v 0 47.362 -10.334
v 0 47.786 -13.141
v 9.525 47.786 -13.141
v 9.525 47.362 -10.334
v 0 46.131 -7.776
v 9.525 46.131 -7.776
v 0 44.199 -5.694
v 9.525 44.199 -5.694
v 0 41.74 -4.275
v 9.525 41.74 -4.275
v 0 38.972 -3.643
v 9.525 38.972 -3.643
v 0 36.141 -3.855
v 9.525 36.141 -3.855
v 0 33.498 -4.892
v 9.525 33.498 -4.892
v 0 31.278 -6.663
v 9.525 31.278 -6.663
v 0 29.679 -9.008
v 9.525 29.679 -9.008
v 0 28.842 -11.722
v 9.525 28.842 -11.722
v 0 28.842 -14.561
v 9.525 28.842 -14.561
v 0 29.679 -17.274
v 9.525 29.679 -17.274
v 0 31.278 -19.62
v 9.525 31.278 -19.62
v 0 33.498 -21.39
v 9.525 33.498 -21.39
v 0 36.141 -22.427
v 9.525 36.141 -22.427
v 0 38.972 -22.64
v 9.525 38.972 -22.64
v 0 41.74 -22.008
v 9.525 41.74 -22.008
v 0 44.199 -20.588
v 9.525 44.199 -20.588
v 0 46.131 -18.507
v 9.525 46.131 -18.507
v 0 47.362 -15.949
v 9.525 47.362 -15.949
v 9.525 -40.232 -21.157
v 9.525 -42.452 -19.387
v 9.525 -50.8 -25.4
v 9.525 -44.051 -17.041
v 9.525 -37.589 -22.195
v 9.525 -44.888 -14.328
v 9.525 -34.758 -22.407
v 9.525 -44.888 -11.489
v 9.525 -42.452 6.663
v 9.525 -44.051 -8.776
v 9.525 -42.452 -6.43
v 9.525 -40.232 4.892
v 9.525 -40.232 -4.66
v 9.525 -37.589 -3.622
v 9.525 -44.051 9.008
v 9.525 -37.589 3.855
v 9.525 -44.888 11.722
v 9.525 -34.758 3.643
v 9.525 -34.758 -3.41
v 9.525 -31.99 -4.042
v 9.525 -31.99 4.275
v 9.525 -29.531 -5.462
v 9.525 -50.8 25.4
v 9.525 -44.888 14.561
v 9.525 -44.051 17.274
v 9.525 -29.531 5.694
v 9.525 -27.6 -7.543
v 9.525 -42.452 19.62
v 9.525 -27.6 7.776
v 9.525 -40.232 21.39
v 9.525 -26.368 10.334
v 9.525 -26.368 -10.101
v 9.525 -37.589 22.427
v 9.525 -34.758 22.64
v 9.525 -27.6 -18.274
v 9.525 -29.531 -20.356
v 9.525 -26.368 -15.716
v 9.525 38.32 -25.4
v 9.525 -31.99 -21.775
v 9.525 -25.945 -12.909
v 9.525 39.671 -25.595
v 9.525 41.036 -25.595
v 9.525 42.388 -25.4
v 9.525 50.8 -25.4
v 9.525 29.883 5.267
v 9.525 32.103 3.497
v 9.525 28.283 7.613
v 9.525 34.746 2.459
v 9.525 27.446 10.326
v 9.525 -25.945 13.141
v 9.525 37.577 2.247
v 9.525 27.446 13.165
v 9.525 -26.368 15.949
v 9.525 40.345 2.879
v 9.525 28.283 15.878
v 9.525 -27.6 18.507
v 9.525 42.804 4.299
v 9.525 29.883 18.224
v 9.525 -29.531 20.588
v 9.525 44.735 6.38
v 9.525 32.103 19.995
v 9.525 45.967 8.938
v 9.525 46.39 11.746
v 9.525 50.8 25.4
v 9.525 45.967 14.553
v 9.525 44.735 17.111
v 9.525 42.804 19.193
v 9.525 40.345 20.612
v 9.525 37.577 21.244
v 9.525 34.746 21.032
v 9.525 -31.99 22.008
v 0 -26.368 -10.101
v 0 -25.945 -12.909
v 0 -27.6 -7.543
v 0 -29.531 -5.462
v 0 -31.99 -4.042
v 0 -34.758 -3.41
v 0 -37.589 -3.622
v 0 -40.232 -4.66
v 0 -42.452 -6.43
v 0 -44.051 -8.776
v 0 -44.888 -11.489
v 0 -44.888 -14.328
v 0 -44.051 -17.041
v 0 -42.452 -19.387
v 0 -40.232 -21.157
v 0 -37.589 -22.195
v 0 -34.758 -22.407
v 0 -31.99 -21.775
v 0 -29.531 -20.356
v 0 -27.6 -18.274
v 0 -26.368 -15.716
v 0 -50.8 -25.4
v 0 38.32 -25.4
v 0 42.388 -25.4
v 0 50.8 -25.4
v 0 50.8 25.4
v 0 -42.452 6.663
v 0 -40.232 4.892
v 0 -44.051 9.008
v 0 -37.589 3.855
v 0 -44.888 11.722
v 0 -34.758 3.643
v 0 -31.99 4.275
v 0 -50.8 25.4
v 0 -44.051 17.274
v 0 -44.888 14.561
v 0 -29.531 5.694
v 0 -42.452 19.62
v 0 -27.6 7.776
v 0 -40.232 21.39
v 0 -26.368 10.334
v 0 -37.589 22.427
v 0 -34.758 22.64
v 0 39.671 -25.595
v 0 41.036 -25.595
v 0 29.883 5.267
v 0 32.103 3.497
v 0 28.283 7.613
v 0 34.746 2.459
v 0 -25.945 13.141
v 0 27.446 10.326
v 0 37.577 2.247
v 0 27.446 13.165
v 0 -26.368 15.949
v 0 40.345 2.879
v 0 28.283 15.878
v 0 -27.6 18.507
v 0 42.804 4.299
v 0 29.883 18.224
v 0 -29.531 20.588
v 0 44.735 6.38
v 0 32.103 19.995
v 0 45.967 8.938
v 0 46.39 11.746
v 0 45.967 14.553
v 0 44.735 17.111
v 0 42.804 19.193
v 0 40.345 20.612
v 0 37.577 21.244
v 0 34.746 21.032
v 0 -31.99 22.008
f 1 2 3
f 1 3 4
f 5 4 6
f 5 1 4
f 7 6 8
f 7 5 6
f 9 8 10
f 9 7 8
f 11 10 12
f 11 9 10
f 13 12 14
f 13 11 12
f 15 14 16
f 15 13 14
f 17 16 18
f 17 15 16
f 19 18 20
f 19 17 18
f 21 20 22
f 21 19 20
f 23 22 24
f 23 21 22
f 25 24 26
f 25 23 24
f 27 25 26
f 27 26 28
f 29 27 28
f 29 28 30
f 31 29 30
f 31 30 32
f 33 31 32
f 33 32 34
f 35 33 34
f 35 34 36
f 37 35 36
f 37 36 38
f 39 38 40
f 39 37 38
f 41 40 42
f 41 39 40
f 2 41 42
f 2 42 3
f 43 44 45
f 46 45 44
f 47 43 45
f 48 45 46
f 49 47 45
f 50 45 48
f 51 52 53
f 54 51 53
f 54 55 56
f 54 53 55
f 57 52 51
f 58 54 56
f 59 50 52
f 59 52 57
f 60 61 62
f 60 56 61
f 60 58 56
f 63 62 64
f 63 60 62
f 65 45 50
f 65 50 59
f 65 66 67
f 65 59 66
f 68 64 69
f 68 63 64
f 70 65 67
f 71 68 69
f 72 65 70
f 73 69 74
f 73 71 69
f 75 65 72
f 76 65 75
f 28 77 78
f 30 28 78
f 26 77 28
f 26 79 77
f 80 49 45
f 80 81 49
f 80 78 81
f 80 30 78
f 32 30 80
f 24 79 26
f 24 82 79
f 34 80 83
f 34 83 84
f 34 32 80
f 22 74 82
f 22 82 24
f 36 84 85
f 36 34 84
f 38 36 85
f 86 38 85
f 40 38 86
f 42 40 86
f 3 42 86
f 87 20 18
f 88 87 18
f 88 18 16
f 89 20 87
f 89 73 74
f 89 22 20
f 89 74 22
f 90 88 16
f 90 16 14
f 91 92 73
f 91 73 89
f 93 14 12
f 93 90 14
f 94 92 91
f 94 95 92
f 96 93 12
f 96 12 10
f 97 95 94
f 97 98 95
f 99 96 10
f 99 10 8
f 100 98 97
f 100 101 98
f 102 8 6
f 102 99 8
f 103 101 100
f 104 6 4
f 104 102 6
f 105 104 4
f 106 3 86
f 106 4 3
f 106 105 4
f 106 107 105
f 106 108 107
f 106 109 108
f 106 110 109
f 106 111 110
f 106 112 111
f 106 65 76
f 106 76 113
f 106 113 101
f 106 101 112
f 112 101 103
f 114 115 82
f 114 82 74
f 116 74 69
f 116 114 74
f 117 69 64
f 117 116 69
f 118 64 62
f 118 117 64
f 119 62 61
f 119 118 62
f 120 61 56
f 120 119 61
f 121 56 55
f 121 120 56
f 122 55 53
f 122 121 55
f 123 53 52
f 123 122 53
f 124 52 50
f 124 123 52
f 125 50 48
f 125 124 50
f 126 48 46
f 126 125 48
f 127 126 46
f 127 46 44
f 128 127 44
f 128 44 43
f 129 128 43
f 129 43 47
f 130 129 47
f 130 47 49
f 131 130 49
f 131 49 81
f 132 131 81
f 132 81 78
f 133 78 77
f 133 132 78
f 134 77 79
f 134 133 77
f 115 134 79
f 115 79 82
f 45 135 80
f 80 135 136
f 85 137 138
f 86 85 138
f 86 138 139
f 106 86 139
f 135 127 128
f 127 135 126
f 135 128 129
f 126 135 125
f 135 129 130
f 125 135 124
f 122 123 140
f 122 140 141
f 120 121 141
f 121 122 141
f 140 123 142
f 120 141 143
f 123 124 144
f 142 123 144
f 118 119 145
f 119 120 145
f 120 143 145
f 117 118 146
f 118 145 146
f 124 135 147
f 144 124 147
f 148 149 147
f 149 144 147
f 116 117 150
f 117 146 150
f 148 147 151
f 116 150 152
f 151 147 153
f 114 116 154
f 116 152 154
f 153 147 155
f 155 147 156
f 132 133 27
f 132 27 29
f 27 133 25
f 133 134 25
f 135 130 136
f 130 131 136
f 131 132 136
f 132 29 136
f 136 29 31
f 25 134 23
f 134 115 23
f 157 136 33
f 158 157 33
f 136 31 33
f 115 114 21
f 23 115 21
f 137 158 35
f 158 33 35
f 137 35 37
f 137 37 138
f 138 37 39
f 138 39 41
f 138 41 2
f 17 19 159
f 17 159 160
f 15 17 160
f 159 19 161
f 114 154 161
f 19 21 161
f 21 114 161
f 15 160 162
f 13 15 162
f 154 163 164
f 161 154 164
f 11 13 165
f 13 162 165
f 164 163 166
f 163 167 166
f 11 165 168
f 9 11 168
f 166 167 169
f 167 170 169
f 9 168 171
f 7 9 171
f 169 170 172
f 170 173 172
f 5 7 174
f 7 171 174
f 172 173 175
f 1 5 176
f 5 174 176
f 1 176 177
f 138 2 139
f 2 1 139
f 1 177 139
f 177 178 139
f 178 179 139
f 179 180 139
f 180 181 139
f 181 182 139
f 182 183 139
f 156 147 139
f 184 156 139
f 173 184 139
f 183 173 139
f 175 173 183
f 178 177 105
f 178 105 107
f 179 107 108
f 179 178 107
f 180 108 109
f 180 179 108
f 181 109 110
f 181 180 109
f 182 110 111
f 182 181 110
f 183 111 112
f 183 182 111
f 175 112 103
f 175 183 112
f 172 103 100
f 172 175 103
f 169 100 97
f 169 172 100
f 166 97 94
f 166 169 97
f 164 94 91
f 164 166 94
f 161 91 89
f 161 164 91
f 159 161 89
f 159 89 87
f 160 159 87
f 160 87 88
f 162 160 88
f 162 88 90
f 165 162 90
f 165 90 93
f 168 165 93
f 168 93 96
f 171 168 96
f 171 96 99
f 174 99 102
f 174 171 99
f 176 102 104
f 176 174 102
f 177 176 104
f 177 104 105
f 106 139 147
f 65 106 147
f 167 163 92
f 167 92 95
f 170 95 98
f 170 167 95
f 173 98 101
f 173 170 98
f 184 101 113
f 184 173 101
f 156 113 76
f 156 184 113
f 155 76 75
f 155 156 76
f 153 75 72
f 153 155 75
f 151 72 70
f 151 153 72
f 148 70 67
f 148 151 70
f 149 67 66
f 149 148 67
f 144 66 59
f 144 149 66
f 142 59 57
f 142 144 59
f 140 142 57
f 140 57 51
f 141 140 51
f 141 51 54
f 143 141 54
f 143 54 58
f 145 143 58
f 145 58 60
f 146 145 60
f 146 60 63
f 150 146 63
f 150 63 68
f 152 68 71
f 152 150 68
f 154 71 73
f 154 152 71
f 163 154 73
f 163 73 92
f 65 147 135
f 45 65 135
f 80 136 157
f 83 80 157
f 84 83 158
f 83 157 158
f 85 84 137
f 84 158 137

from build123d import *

# Parameters (mm, degrees)
F0_R     = 9.525
F1_DEPTH = 9.525


with BuildPart() as f1:
    # F0 (on Right) → F1 (new body)
    with BuildSketch(Plane.YZ):
        Polygon((50.8, 25.4), (-50.8, 25.4), (-50.8, -25.4), (38.320067, -25.4), (42.387699, -25.4), (50.8, -25.4), align=None)
        with Locations((-35.469551, -12.90859)):
            Circle(F0_R, mode=Mode.SUBTRACT)
        with Locations((38.260598, -13.141178)):
            Circle(F0_R, mode=Mode.SUBTRACT)
        with Locations((-35.469551, 13.141178)):
            Circle(F0_R, mode=Mode.SUBTRACT)
        with Locations((36.865074, 11.745654)):
            Circle(F0_R, mode=Mode.SUBTRACT)
        with BuildLine():
            Line((42.387699, -25.4), (38.320067, -25.4))
            ThreePointArc((38.320067, -25.4), (40.353883, -25.619667), (42.387699, -25.4))
        make_face()
    extrude(amount=F1_DEPTH)


solid = f1.part
